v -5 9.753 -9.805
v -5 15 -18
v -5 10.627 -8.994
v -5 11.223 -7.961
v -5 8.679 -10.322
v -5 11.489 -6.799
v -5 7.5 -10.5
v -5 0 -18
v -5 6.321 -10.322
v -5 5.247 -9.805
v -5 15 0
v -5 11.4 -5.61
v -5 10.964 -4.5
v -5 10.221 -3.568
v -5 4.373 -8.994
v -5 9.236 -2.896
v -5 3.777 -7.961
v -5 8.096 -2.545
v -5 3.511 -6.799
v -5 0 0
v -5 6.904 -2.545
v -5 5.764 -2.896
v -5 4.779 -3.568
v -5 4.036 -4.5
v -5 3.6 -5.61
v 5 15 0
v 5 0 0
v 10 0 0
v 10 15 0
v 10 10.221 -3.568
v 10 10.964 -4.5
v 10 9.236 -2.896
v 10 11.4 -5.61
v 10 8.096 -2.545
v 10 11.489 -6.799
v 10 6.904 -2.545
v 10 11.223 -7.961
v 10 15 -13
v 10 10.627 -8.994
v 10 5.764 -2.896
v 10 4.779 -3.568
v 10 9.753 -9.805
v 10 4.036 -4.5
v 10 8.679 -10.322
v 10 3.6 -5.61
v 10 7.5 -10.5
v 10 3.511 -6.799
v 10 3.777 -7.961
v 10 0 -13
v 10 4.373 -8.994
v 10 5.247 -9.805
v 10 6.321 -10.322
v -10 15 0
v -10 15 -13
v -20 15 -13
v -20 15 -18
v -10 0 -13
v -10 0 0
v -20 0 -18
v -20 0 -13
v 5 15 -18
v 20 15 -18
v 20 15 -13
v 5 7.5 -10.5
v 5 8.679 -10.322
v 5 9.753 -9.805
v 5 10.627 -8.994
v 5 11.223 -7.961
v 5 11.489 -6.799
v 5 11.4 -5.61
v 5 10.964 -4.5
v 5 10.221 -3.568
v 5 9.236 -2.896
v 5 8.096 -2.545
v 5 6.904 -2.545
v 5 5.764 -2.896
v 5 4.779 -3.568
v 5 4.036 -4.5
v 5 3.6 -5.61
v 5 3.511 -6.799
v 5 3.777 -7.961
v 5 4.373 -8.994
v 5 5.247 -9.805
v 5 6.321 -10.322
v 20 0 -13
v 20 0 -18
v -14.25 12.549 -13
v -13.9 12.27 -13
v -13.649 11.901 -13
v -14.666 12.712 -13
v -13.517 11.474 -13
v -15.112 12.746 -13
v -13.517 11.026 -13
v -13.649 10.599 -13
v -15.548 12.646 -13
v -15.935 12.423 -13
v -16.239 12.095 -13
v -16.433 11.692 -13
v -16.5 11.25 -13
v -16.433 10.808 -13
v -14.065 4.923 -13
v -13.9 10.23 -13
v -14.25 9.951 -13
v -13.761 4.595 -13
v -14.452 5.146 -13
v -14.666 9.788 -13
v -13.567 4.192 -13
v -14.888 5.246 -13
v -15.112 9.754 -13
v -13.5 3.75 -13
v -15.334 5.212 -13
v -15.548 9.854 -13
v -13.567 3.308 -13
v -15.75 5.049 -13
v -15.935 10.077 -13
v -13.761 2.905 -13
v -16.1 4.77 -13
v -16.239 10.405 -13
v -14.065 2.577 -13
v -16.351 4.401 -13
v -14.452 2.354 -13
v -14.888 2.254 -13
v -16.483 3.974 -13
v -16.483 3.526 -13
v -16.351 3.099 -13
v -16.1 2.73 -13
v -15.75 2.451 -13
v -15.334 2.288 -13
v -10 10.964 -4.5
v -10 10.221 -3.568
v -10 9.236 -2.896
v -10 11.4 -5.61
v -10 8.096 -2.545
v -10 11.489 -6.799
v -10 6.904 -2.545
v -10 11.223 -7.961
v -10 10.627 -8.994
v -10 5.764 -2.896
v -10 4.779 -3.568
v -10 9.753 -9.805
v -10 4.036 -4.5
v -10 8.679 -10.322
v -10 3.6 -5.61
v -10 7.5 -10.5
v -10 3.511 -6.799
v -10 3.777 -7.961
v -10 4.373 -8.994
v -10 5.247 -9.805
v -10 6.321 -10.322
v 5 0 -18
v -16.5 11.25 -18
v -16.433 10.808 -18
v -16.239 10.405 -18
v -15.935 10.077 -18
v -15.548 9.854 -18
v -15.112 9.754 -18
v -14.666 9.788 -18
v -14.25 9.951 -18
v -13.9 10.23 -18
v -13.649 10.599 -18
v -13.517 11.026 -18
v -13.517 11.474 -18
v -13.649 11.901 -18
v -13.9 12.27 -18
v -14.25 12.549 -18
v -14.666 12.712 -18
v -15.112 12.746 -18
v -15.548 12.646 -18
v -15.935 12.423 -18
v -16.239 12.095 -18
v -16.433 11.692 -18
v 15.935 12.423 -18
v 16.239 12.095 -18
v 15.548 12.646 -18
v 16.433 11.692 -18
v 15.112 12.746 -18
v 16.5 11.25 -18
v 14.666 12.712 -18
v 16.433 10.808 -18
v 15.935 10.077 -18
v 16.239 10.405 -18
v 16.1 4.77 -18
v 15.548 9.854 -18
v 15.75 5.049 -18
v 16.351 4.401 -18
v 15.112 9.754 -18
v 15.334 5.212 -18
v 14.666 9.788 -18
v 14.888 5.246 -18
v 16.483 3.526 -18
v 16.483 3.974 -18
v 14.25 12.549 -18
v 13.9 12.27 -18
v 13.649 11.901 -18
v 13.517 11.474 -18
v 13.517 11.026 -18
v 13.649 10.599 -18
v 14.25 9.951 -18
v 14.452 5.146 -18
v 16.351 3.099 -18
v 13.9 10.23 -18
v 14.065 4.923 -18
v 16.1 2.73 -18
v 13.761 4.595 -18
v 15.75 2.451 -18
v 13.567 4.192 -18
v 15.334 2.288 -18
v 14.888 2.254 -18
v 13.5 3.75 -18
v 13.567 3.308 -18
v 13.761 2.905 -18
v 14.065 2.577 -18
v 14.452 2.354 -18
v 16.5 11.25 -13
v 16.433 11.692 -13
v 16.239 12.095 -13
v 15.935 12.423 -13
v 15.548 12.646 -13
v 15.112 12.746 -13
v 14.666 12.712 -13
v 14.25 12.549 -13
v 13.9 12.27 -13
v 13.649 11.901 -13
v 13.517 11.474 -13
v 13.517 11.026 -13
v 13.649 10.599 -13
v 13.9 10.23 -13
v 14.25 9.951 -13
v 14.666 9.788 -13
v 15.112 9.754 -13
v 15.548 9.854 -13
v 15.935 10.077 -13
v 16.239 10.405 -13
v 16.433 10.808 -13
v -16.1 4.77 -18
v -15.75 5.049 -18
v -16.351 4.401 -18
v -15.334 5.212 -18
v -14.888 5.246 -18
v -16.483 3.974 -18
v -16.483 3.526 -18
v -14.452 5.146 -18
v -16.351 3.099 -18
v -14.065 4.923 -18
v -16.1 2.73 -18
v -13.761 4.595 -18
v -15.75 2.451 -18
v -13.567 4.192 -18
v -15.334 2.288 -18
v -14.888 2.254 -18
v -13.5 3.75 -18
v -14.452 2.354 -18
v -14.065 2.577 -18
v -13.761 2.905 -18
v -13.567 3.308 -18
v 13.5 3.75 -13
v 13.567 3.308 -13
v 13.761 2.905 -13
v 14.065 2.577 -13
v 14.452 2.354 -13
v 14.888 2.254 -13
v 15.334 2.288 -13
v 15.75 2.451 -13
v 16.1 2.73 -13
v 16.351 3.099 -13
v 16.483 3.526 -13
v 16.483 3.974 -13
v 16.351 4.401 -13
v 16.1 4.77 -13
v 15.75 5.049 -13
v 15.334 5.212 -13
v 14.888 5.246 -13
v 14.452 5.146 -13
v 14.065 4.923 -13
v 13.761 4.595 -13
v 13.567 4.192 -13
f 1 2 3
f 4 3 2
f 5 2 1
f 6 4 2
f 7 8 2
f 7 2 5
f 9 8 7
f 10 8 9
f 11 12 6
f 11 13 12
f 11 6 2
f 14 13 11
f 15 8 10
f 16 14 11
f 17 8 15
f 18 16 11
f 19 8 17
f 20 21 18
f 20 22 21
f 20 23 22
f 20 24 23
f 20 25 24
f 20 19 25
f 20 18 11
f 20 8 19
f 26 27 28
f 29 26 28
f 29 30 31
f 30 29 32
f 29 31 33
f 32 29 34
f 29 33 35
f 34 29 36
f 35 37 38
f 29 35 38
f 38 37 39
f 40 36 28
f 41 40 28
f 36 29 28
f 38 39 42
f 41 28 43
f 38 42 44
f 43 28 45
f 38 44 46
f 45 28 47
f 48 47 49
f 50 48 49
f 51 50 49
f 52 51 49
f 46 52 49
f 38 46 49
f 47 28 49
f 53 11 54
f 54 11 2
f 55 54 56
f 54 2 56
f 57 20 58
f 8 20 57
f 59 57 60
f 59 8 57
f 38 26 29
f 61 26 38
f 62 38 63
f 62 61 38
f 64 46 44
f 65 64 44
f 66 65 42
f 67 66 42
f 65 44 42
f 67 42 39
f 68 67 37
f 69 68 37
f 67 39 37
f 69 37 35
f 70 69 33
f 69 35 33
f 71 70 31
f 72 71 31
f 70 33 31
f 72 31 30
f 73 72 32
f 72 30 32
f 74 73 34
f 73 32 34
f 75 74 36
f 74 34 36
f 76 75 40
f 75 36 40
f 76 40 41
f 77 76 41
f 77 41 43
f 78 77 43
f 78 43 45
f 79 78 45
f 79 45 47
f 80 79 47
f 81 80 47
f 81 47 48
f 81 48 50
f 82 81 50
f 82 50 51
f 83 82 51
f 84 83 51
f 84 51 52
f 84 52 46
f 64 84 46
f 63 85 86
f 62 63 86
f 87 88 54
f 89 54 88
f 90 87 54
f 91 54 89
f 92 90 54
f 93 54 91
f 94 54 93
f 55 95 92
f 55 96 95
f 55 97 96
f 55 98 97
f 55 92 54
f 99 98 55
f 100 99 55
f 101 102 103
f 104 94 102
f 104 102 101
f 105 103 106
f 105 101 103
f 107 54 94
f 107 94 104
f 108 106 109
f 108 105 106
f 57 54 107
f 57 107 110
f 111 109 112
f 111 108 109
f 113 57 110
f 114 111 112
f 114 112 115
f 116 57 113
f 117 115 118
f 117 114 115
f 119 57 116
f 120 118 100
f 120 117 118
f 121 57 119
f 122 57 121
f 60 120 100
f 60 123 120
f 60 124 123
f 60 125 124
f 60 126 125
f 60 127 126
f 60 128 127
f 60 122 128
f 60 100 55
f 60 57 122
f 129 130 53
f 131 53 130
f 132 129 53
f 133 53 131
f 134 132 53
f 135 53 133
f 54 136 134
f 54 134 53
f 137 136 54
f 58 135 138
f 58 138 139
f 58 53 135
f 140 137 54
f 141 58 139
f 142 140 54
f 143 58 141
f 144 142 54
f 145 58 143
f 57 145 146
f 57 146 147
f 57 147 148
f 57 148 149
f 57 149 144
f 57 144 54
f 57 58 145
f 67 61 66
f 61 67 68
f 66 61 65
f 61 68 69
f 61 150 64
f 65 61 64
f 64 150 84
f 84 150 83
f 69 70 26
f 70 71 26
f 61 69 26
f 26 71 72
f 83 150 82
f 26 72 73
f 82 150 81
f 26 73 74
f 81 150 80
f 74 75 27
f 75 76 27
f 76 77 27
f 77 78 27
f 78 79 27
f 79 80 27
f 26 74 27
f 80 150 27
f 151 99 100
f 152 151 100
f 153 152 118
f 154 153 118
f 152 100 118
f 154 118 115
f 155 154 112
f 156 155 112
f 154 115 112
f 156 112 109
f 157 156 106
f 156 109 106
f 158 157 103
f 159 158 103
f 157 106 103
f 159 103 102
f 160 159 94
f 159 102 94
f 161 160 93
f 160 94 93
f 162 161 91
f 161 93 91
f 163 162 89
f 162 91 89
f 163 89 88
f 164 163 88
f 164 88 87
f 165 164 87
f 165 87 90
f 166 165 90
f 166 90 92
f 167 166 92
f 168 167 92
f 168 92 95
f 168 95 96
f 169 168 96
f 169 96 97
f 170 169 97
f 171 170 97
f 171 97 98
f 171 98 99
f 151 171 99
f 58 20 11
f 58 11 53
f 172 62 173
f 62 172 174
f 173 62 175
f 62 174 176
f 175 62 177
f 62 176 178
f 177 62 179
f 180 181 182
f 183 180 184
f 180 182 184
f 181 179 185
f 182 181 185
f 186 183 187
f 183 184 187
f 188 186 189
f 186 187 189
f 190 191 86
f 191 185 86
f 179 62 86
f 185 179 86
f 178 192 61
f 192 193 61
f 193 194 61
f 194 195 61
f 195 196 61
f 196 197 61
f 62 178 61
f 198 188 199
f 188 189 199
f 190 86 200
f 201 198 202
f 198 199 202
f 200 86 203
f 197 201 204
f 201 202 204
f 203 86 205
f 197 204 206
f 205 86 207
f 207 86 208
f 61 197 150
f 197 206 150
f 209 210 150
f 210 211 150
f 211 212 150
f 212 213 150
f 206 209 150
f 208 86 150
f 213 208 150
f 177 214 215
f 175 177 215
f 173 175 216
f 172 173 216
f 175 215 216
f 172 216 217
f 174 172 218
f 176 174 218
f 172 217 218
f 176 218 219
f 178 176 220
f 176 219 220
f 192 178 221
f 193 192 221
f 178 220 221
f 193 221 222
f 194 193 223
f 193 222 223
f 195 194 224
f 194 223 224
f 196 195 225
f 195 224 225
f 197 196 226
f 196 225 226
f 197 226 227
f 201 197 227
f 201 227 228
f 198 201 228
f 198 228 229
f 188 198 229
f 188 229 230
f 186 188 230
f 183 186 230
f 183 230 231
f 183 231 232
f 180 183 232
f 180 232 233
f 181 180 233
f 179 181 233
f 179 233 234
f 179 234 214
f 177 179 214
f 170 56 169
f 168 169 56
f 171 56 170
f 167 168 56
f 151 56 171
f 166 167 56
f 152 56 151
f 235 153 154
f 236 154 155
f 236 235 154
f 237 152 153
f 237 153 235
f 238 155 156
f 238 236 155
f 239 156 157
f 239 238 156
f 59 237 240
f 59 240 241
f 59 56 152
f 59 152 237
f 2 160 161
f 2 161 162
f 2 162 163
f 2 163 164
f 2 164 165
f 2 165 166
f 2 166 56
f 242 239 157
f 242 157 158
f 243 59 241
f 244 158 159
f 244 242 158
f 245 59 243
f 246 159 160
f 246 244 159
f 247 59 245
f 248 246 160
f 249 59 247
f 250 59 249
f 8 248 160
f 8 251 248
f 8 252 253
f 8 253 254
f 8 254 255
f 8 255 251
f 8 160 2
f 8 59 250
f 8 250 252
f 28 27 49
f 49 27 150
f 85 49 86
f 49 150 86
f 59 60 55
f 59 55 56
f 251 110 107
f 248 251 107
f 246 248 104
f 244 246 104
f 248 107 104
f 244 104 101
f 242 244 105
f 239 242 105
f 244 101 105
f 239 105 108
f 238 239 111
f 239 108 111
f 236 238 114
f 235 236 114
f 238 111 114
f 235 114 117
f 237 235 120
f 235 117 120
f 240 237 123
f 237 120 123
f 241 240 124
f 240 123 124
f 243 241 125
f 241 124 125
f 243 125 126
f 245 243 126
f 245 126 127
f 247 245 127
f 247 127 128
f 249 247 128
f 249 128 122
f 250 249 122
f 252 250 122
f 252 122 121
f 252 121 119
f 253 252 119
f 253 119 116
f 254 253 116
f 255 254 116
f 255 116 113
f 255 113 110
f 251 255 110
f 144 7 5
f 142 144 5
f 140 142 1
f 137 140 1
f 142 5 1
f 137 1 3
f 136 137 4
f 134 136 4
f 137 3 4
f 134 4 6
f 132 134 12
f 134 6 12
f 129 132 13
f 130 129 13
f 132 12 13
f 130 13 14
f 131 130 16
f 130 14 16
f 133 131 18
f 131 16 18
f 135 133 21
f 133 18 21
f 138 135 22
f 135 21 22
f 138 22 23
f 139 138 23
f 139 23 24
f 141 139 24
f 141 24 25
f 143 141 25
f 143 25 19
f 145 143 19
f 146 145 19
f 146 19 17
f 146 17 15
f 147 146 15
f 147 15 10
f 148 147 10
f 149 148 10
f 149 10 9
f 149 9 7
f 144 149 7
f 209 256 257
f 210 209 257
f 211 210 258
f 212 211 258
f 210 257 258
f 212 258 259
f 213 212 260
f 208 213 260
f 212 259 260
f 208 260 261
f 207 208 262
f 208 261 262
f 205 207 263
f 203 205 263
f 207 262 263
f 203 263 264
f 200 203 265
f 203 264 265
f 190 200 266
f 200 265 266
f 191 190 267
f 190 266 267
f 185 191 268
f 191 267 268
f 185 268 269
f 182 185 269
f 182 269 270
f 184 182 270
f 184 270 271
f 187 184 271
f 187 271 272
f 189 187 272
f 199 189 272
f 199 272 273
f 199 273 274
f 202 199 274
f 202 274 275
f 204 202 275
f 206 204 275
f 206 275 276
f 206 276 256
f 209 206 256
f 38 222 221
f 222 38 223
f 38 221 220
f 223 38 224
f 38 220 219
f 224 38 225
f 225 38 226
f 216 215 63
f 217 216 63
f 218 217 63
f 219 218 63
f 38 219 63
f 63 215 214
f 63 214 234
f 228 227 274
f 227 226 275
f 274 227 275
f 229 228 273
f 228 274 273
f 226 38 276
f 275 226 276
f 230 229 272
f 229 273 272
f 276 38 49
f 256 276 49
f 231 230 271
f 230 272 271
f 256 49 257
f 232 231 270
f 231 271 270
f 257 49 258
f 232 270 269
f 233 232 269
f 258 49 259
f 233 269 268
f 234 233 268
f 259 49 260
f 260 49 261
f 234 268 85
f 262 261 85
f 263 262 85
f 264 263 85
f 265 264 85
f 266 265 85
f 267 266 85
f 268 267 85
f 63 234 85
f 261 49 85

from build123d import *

# Parameters (mm, degrees)
BOSS_EXTRUDE1_DEPTH   = 15
BOSS_EXTRUDE1_2_DEPTH = 15
SKETCH2_R             = 4
CUT_EXTRUDE1_DEPTH    = 39.065732621
SKETCH3_R             = 1.5
CUT_EXTRUDE2_DEPTH    = 29.178005607


with BuildPart() as part:
    # Sketch1 → Boss-Extrude1 (new body)
    with BuildSketch(Plane(origin=(0, 0, 0), x_dir=(1, 0, 0), z_dir=(0, 1, 0))):
        Polygon((-5, 18), (-5, 0), (-10, 0), (-10, 13), (-20, 13), (-20, 18), align=None)
    extrude(amount=BOSS_EXTRUDE1_DEPTH)


with BuildPart() as body_2:
    # Sketch1 → Boss-Extrude1 2 (new body)
    with BuildSketch(Plane(origin=(0, 0, 0), x_dir=(1, 0, 0), z_dir=(0, 1, 0))):
        Polygon((20, 18), (5, 18), (5, 0), (10, 0), (10, 13), (20, 13), align=None)
    extrude(amount=BOSS_EXTRUDE1_2_DEPTH)


with BuildPart() as cut_extrude1_tool:
    # Sketch2 → Cut-Extrude1 (new, through all)
    with BuildSketch(Plane(origin=(10, 0, 0), x_dir=(0, 0, -1), z_dir=(1, 0, 0))):
        with Locations((6.5, 7.5)):
            Circle(SKETCH2_R)
    extrude(amount=-CUT_EXTRUDE1_DEPTH)


with BuildPart() as part_1:
    add(part.part)

    # Cut-Extrude1: cut by cut_extrude1_tool
    add(cut_extrude1_tool.part, mode=Mode.SUBTRACT)


with BuildPart() as body_2_1:
    add(body_2.part)

    # Cut-Extrude1: cut by cut_extrude1_tool
    add(cut_extrude1_tool.part, mode=Mode.SUBTRACT)


with BuildPart() as cut_extrude2_tool:
    # Sketch3 → Cut-Extrude2 (new, through all)
    with BuildSketch(Plane.XY.offset(-13)):
        with Locations((-15, 3.75)):
            Circle(SKETCH3_R)
        with Locations(Location((-15, 11.25, 0), (0, 0, 180))):
            Circle(SKETCH3_R)
        with Locations((15, 11.25)):
            Circle(SKETCH3_R)
        with Locations(Location((15, 3.75, 0), (0, 0, 180))):
            Circle(SKETCH3_R)
    extrude(amount=-CUT_EXTRUDE2_DEPTH)


with BuildPart() as part_2:
    add(part_1.part)

    # Cut-Extrude2: cut by cut_extrude2_tool
    add(cut_extrude2_tool.part, mode=Mode.SUBTRACT)


with BuildPart() as body_2_2:
    add(body_2_1.part)

    # Cut-Extrude2: cut by cut_extrude2_tool
    add(cut_extrude2_tool.part, mode=Mode.SUBTRACT)


solid = Compound([part_2.part, body_2_2.part])
